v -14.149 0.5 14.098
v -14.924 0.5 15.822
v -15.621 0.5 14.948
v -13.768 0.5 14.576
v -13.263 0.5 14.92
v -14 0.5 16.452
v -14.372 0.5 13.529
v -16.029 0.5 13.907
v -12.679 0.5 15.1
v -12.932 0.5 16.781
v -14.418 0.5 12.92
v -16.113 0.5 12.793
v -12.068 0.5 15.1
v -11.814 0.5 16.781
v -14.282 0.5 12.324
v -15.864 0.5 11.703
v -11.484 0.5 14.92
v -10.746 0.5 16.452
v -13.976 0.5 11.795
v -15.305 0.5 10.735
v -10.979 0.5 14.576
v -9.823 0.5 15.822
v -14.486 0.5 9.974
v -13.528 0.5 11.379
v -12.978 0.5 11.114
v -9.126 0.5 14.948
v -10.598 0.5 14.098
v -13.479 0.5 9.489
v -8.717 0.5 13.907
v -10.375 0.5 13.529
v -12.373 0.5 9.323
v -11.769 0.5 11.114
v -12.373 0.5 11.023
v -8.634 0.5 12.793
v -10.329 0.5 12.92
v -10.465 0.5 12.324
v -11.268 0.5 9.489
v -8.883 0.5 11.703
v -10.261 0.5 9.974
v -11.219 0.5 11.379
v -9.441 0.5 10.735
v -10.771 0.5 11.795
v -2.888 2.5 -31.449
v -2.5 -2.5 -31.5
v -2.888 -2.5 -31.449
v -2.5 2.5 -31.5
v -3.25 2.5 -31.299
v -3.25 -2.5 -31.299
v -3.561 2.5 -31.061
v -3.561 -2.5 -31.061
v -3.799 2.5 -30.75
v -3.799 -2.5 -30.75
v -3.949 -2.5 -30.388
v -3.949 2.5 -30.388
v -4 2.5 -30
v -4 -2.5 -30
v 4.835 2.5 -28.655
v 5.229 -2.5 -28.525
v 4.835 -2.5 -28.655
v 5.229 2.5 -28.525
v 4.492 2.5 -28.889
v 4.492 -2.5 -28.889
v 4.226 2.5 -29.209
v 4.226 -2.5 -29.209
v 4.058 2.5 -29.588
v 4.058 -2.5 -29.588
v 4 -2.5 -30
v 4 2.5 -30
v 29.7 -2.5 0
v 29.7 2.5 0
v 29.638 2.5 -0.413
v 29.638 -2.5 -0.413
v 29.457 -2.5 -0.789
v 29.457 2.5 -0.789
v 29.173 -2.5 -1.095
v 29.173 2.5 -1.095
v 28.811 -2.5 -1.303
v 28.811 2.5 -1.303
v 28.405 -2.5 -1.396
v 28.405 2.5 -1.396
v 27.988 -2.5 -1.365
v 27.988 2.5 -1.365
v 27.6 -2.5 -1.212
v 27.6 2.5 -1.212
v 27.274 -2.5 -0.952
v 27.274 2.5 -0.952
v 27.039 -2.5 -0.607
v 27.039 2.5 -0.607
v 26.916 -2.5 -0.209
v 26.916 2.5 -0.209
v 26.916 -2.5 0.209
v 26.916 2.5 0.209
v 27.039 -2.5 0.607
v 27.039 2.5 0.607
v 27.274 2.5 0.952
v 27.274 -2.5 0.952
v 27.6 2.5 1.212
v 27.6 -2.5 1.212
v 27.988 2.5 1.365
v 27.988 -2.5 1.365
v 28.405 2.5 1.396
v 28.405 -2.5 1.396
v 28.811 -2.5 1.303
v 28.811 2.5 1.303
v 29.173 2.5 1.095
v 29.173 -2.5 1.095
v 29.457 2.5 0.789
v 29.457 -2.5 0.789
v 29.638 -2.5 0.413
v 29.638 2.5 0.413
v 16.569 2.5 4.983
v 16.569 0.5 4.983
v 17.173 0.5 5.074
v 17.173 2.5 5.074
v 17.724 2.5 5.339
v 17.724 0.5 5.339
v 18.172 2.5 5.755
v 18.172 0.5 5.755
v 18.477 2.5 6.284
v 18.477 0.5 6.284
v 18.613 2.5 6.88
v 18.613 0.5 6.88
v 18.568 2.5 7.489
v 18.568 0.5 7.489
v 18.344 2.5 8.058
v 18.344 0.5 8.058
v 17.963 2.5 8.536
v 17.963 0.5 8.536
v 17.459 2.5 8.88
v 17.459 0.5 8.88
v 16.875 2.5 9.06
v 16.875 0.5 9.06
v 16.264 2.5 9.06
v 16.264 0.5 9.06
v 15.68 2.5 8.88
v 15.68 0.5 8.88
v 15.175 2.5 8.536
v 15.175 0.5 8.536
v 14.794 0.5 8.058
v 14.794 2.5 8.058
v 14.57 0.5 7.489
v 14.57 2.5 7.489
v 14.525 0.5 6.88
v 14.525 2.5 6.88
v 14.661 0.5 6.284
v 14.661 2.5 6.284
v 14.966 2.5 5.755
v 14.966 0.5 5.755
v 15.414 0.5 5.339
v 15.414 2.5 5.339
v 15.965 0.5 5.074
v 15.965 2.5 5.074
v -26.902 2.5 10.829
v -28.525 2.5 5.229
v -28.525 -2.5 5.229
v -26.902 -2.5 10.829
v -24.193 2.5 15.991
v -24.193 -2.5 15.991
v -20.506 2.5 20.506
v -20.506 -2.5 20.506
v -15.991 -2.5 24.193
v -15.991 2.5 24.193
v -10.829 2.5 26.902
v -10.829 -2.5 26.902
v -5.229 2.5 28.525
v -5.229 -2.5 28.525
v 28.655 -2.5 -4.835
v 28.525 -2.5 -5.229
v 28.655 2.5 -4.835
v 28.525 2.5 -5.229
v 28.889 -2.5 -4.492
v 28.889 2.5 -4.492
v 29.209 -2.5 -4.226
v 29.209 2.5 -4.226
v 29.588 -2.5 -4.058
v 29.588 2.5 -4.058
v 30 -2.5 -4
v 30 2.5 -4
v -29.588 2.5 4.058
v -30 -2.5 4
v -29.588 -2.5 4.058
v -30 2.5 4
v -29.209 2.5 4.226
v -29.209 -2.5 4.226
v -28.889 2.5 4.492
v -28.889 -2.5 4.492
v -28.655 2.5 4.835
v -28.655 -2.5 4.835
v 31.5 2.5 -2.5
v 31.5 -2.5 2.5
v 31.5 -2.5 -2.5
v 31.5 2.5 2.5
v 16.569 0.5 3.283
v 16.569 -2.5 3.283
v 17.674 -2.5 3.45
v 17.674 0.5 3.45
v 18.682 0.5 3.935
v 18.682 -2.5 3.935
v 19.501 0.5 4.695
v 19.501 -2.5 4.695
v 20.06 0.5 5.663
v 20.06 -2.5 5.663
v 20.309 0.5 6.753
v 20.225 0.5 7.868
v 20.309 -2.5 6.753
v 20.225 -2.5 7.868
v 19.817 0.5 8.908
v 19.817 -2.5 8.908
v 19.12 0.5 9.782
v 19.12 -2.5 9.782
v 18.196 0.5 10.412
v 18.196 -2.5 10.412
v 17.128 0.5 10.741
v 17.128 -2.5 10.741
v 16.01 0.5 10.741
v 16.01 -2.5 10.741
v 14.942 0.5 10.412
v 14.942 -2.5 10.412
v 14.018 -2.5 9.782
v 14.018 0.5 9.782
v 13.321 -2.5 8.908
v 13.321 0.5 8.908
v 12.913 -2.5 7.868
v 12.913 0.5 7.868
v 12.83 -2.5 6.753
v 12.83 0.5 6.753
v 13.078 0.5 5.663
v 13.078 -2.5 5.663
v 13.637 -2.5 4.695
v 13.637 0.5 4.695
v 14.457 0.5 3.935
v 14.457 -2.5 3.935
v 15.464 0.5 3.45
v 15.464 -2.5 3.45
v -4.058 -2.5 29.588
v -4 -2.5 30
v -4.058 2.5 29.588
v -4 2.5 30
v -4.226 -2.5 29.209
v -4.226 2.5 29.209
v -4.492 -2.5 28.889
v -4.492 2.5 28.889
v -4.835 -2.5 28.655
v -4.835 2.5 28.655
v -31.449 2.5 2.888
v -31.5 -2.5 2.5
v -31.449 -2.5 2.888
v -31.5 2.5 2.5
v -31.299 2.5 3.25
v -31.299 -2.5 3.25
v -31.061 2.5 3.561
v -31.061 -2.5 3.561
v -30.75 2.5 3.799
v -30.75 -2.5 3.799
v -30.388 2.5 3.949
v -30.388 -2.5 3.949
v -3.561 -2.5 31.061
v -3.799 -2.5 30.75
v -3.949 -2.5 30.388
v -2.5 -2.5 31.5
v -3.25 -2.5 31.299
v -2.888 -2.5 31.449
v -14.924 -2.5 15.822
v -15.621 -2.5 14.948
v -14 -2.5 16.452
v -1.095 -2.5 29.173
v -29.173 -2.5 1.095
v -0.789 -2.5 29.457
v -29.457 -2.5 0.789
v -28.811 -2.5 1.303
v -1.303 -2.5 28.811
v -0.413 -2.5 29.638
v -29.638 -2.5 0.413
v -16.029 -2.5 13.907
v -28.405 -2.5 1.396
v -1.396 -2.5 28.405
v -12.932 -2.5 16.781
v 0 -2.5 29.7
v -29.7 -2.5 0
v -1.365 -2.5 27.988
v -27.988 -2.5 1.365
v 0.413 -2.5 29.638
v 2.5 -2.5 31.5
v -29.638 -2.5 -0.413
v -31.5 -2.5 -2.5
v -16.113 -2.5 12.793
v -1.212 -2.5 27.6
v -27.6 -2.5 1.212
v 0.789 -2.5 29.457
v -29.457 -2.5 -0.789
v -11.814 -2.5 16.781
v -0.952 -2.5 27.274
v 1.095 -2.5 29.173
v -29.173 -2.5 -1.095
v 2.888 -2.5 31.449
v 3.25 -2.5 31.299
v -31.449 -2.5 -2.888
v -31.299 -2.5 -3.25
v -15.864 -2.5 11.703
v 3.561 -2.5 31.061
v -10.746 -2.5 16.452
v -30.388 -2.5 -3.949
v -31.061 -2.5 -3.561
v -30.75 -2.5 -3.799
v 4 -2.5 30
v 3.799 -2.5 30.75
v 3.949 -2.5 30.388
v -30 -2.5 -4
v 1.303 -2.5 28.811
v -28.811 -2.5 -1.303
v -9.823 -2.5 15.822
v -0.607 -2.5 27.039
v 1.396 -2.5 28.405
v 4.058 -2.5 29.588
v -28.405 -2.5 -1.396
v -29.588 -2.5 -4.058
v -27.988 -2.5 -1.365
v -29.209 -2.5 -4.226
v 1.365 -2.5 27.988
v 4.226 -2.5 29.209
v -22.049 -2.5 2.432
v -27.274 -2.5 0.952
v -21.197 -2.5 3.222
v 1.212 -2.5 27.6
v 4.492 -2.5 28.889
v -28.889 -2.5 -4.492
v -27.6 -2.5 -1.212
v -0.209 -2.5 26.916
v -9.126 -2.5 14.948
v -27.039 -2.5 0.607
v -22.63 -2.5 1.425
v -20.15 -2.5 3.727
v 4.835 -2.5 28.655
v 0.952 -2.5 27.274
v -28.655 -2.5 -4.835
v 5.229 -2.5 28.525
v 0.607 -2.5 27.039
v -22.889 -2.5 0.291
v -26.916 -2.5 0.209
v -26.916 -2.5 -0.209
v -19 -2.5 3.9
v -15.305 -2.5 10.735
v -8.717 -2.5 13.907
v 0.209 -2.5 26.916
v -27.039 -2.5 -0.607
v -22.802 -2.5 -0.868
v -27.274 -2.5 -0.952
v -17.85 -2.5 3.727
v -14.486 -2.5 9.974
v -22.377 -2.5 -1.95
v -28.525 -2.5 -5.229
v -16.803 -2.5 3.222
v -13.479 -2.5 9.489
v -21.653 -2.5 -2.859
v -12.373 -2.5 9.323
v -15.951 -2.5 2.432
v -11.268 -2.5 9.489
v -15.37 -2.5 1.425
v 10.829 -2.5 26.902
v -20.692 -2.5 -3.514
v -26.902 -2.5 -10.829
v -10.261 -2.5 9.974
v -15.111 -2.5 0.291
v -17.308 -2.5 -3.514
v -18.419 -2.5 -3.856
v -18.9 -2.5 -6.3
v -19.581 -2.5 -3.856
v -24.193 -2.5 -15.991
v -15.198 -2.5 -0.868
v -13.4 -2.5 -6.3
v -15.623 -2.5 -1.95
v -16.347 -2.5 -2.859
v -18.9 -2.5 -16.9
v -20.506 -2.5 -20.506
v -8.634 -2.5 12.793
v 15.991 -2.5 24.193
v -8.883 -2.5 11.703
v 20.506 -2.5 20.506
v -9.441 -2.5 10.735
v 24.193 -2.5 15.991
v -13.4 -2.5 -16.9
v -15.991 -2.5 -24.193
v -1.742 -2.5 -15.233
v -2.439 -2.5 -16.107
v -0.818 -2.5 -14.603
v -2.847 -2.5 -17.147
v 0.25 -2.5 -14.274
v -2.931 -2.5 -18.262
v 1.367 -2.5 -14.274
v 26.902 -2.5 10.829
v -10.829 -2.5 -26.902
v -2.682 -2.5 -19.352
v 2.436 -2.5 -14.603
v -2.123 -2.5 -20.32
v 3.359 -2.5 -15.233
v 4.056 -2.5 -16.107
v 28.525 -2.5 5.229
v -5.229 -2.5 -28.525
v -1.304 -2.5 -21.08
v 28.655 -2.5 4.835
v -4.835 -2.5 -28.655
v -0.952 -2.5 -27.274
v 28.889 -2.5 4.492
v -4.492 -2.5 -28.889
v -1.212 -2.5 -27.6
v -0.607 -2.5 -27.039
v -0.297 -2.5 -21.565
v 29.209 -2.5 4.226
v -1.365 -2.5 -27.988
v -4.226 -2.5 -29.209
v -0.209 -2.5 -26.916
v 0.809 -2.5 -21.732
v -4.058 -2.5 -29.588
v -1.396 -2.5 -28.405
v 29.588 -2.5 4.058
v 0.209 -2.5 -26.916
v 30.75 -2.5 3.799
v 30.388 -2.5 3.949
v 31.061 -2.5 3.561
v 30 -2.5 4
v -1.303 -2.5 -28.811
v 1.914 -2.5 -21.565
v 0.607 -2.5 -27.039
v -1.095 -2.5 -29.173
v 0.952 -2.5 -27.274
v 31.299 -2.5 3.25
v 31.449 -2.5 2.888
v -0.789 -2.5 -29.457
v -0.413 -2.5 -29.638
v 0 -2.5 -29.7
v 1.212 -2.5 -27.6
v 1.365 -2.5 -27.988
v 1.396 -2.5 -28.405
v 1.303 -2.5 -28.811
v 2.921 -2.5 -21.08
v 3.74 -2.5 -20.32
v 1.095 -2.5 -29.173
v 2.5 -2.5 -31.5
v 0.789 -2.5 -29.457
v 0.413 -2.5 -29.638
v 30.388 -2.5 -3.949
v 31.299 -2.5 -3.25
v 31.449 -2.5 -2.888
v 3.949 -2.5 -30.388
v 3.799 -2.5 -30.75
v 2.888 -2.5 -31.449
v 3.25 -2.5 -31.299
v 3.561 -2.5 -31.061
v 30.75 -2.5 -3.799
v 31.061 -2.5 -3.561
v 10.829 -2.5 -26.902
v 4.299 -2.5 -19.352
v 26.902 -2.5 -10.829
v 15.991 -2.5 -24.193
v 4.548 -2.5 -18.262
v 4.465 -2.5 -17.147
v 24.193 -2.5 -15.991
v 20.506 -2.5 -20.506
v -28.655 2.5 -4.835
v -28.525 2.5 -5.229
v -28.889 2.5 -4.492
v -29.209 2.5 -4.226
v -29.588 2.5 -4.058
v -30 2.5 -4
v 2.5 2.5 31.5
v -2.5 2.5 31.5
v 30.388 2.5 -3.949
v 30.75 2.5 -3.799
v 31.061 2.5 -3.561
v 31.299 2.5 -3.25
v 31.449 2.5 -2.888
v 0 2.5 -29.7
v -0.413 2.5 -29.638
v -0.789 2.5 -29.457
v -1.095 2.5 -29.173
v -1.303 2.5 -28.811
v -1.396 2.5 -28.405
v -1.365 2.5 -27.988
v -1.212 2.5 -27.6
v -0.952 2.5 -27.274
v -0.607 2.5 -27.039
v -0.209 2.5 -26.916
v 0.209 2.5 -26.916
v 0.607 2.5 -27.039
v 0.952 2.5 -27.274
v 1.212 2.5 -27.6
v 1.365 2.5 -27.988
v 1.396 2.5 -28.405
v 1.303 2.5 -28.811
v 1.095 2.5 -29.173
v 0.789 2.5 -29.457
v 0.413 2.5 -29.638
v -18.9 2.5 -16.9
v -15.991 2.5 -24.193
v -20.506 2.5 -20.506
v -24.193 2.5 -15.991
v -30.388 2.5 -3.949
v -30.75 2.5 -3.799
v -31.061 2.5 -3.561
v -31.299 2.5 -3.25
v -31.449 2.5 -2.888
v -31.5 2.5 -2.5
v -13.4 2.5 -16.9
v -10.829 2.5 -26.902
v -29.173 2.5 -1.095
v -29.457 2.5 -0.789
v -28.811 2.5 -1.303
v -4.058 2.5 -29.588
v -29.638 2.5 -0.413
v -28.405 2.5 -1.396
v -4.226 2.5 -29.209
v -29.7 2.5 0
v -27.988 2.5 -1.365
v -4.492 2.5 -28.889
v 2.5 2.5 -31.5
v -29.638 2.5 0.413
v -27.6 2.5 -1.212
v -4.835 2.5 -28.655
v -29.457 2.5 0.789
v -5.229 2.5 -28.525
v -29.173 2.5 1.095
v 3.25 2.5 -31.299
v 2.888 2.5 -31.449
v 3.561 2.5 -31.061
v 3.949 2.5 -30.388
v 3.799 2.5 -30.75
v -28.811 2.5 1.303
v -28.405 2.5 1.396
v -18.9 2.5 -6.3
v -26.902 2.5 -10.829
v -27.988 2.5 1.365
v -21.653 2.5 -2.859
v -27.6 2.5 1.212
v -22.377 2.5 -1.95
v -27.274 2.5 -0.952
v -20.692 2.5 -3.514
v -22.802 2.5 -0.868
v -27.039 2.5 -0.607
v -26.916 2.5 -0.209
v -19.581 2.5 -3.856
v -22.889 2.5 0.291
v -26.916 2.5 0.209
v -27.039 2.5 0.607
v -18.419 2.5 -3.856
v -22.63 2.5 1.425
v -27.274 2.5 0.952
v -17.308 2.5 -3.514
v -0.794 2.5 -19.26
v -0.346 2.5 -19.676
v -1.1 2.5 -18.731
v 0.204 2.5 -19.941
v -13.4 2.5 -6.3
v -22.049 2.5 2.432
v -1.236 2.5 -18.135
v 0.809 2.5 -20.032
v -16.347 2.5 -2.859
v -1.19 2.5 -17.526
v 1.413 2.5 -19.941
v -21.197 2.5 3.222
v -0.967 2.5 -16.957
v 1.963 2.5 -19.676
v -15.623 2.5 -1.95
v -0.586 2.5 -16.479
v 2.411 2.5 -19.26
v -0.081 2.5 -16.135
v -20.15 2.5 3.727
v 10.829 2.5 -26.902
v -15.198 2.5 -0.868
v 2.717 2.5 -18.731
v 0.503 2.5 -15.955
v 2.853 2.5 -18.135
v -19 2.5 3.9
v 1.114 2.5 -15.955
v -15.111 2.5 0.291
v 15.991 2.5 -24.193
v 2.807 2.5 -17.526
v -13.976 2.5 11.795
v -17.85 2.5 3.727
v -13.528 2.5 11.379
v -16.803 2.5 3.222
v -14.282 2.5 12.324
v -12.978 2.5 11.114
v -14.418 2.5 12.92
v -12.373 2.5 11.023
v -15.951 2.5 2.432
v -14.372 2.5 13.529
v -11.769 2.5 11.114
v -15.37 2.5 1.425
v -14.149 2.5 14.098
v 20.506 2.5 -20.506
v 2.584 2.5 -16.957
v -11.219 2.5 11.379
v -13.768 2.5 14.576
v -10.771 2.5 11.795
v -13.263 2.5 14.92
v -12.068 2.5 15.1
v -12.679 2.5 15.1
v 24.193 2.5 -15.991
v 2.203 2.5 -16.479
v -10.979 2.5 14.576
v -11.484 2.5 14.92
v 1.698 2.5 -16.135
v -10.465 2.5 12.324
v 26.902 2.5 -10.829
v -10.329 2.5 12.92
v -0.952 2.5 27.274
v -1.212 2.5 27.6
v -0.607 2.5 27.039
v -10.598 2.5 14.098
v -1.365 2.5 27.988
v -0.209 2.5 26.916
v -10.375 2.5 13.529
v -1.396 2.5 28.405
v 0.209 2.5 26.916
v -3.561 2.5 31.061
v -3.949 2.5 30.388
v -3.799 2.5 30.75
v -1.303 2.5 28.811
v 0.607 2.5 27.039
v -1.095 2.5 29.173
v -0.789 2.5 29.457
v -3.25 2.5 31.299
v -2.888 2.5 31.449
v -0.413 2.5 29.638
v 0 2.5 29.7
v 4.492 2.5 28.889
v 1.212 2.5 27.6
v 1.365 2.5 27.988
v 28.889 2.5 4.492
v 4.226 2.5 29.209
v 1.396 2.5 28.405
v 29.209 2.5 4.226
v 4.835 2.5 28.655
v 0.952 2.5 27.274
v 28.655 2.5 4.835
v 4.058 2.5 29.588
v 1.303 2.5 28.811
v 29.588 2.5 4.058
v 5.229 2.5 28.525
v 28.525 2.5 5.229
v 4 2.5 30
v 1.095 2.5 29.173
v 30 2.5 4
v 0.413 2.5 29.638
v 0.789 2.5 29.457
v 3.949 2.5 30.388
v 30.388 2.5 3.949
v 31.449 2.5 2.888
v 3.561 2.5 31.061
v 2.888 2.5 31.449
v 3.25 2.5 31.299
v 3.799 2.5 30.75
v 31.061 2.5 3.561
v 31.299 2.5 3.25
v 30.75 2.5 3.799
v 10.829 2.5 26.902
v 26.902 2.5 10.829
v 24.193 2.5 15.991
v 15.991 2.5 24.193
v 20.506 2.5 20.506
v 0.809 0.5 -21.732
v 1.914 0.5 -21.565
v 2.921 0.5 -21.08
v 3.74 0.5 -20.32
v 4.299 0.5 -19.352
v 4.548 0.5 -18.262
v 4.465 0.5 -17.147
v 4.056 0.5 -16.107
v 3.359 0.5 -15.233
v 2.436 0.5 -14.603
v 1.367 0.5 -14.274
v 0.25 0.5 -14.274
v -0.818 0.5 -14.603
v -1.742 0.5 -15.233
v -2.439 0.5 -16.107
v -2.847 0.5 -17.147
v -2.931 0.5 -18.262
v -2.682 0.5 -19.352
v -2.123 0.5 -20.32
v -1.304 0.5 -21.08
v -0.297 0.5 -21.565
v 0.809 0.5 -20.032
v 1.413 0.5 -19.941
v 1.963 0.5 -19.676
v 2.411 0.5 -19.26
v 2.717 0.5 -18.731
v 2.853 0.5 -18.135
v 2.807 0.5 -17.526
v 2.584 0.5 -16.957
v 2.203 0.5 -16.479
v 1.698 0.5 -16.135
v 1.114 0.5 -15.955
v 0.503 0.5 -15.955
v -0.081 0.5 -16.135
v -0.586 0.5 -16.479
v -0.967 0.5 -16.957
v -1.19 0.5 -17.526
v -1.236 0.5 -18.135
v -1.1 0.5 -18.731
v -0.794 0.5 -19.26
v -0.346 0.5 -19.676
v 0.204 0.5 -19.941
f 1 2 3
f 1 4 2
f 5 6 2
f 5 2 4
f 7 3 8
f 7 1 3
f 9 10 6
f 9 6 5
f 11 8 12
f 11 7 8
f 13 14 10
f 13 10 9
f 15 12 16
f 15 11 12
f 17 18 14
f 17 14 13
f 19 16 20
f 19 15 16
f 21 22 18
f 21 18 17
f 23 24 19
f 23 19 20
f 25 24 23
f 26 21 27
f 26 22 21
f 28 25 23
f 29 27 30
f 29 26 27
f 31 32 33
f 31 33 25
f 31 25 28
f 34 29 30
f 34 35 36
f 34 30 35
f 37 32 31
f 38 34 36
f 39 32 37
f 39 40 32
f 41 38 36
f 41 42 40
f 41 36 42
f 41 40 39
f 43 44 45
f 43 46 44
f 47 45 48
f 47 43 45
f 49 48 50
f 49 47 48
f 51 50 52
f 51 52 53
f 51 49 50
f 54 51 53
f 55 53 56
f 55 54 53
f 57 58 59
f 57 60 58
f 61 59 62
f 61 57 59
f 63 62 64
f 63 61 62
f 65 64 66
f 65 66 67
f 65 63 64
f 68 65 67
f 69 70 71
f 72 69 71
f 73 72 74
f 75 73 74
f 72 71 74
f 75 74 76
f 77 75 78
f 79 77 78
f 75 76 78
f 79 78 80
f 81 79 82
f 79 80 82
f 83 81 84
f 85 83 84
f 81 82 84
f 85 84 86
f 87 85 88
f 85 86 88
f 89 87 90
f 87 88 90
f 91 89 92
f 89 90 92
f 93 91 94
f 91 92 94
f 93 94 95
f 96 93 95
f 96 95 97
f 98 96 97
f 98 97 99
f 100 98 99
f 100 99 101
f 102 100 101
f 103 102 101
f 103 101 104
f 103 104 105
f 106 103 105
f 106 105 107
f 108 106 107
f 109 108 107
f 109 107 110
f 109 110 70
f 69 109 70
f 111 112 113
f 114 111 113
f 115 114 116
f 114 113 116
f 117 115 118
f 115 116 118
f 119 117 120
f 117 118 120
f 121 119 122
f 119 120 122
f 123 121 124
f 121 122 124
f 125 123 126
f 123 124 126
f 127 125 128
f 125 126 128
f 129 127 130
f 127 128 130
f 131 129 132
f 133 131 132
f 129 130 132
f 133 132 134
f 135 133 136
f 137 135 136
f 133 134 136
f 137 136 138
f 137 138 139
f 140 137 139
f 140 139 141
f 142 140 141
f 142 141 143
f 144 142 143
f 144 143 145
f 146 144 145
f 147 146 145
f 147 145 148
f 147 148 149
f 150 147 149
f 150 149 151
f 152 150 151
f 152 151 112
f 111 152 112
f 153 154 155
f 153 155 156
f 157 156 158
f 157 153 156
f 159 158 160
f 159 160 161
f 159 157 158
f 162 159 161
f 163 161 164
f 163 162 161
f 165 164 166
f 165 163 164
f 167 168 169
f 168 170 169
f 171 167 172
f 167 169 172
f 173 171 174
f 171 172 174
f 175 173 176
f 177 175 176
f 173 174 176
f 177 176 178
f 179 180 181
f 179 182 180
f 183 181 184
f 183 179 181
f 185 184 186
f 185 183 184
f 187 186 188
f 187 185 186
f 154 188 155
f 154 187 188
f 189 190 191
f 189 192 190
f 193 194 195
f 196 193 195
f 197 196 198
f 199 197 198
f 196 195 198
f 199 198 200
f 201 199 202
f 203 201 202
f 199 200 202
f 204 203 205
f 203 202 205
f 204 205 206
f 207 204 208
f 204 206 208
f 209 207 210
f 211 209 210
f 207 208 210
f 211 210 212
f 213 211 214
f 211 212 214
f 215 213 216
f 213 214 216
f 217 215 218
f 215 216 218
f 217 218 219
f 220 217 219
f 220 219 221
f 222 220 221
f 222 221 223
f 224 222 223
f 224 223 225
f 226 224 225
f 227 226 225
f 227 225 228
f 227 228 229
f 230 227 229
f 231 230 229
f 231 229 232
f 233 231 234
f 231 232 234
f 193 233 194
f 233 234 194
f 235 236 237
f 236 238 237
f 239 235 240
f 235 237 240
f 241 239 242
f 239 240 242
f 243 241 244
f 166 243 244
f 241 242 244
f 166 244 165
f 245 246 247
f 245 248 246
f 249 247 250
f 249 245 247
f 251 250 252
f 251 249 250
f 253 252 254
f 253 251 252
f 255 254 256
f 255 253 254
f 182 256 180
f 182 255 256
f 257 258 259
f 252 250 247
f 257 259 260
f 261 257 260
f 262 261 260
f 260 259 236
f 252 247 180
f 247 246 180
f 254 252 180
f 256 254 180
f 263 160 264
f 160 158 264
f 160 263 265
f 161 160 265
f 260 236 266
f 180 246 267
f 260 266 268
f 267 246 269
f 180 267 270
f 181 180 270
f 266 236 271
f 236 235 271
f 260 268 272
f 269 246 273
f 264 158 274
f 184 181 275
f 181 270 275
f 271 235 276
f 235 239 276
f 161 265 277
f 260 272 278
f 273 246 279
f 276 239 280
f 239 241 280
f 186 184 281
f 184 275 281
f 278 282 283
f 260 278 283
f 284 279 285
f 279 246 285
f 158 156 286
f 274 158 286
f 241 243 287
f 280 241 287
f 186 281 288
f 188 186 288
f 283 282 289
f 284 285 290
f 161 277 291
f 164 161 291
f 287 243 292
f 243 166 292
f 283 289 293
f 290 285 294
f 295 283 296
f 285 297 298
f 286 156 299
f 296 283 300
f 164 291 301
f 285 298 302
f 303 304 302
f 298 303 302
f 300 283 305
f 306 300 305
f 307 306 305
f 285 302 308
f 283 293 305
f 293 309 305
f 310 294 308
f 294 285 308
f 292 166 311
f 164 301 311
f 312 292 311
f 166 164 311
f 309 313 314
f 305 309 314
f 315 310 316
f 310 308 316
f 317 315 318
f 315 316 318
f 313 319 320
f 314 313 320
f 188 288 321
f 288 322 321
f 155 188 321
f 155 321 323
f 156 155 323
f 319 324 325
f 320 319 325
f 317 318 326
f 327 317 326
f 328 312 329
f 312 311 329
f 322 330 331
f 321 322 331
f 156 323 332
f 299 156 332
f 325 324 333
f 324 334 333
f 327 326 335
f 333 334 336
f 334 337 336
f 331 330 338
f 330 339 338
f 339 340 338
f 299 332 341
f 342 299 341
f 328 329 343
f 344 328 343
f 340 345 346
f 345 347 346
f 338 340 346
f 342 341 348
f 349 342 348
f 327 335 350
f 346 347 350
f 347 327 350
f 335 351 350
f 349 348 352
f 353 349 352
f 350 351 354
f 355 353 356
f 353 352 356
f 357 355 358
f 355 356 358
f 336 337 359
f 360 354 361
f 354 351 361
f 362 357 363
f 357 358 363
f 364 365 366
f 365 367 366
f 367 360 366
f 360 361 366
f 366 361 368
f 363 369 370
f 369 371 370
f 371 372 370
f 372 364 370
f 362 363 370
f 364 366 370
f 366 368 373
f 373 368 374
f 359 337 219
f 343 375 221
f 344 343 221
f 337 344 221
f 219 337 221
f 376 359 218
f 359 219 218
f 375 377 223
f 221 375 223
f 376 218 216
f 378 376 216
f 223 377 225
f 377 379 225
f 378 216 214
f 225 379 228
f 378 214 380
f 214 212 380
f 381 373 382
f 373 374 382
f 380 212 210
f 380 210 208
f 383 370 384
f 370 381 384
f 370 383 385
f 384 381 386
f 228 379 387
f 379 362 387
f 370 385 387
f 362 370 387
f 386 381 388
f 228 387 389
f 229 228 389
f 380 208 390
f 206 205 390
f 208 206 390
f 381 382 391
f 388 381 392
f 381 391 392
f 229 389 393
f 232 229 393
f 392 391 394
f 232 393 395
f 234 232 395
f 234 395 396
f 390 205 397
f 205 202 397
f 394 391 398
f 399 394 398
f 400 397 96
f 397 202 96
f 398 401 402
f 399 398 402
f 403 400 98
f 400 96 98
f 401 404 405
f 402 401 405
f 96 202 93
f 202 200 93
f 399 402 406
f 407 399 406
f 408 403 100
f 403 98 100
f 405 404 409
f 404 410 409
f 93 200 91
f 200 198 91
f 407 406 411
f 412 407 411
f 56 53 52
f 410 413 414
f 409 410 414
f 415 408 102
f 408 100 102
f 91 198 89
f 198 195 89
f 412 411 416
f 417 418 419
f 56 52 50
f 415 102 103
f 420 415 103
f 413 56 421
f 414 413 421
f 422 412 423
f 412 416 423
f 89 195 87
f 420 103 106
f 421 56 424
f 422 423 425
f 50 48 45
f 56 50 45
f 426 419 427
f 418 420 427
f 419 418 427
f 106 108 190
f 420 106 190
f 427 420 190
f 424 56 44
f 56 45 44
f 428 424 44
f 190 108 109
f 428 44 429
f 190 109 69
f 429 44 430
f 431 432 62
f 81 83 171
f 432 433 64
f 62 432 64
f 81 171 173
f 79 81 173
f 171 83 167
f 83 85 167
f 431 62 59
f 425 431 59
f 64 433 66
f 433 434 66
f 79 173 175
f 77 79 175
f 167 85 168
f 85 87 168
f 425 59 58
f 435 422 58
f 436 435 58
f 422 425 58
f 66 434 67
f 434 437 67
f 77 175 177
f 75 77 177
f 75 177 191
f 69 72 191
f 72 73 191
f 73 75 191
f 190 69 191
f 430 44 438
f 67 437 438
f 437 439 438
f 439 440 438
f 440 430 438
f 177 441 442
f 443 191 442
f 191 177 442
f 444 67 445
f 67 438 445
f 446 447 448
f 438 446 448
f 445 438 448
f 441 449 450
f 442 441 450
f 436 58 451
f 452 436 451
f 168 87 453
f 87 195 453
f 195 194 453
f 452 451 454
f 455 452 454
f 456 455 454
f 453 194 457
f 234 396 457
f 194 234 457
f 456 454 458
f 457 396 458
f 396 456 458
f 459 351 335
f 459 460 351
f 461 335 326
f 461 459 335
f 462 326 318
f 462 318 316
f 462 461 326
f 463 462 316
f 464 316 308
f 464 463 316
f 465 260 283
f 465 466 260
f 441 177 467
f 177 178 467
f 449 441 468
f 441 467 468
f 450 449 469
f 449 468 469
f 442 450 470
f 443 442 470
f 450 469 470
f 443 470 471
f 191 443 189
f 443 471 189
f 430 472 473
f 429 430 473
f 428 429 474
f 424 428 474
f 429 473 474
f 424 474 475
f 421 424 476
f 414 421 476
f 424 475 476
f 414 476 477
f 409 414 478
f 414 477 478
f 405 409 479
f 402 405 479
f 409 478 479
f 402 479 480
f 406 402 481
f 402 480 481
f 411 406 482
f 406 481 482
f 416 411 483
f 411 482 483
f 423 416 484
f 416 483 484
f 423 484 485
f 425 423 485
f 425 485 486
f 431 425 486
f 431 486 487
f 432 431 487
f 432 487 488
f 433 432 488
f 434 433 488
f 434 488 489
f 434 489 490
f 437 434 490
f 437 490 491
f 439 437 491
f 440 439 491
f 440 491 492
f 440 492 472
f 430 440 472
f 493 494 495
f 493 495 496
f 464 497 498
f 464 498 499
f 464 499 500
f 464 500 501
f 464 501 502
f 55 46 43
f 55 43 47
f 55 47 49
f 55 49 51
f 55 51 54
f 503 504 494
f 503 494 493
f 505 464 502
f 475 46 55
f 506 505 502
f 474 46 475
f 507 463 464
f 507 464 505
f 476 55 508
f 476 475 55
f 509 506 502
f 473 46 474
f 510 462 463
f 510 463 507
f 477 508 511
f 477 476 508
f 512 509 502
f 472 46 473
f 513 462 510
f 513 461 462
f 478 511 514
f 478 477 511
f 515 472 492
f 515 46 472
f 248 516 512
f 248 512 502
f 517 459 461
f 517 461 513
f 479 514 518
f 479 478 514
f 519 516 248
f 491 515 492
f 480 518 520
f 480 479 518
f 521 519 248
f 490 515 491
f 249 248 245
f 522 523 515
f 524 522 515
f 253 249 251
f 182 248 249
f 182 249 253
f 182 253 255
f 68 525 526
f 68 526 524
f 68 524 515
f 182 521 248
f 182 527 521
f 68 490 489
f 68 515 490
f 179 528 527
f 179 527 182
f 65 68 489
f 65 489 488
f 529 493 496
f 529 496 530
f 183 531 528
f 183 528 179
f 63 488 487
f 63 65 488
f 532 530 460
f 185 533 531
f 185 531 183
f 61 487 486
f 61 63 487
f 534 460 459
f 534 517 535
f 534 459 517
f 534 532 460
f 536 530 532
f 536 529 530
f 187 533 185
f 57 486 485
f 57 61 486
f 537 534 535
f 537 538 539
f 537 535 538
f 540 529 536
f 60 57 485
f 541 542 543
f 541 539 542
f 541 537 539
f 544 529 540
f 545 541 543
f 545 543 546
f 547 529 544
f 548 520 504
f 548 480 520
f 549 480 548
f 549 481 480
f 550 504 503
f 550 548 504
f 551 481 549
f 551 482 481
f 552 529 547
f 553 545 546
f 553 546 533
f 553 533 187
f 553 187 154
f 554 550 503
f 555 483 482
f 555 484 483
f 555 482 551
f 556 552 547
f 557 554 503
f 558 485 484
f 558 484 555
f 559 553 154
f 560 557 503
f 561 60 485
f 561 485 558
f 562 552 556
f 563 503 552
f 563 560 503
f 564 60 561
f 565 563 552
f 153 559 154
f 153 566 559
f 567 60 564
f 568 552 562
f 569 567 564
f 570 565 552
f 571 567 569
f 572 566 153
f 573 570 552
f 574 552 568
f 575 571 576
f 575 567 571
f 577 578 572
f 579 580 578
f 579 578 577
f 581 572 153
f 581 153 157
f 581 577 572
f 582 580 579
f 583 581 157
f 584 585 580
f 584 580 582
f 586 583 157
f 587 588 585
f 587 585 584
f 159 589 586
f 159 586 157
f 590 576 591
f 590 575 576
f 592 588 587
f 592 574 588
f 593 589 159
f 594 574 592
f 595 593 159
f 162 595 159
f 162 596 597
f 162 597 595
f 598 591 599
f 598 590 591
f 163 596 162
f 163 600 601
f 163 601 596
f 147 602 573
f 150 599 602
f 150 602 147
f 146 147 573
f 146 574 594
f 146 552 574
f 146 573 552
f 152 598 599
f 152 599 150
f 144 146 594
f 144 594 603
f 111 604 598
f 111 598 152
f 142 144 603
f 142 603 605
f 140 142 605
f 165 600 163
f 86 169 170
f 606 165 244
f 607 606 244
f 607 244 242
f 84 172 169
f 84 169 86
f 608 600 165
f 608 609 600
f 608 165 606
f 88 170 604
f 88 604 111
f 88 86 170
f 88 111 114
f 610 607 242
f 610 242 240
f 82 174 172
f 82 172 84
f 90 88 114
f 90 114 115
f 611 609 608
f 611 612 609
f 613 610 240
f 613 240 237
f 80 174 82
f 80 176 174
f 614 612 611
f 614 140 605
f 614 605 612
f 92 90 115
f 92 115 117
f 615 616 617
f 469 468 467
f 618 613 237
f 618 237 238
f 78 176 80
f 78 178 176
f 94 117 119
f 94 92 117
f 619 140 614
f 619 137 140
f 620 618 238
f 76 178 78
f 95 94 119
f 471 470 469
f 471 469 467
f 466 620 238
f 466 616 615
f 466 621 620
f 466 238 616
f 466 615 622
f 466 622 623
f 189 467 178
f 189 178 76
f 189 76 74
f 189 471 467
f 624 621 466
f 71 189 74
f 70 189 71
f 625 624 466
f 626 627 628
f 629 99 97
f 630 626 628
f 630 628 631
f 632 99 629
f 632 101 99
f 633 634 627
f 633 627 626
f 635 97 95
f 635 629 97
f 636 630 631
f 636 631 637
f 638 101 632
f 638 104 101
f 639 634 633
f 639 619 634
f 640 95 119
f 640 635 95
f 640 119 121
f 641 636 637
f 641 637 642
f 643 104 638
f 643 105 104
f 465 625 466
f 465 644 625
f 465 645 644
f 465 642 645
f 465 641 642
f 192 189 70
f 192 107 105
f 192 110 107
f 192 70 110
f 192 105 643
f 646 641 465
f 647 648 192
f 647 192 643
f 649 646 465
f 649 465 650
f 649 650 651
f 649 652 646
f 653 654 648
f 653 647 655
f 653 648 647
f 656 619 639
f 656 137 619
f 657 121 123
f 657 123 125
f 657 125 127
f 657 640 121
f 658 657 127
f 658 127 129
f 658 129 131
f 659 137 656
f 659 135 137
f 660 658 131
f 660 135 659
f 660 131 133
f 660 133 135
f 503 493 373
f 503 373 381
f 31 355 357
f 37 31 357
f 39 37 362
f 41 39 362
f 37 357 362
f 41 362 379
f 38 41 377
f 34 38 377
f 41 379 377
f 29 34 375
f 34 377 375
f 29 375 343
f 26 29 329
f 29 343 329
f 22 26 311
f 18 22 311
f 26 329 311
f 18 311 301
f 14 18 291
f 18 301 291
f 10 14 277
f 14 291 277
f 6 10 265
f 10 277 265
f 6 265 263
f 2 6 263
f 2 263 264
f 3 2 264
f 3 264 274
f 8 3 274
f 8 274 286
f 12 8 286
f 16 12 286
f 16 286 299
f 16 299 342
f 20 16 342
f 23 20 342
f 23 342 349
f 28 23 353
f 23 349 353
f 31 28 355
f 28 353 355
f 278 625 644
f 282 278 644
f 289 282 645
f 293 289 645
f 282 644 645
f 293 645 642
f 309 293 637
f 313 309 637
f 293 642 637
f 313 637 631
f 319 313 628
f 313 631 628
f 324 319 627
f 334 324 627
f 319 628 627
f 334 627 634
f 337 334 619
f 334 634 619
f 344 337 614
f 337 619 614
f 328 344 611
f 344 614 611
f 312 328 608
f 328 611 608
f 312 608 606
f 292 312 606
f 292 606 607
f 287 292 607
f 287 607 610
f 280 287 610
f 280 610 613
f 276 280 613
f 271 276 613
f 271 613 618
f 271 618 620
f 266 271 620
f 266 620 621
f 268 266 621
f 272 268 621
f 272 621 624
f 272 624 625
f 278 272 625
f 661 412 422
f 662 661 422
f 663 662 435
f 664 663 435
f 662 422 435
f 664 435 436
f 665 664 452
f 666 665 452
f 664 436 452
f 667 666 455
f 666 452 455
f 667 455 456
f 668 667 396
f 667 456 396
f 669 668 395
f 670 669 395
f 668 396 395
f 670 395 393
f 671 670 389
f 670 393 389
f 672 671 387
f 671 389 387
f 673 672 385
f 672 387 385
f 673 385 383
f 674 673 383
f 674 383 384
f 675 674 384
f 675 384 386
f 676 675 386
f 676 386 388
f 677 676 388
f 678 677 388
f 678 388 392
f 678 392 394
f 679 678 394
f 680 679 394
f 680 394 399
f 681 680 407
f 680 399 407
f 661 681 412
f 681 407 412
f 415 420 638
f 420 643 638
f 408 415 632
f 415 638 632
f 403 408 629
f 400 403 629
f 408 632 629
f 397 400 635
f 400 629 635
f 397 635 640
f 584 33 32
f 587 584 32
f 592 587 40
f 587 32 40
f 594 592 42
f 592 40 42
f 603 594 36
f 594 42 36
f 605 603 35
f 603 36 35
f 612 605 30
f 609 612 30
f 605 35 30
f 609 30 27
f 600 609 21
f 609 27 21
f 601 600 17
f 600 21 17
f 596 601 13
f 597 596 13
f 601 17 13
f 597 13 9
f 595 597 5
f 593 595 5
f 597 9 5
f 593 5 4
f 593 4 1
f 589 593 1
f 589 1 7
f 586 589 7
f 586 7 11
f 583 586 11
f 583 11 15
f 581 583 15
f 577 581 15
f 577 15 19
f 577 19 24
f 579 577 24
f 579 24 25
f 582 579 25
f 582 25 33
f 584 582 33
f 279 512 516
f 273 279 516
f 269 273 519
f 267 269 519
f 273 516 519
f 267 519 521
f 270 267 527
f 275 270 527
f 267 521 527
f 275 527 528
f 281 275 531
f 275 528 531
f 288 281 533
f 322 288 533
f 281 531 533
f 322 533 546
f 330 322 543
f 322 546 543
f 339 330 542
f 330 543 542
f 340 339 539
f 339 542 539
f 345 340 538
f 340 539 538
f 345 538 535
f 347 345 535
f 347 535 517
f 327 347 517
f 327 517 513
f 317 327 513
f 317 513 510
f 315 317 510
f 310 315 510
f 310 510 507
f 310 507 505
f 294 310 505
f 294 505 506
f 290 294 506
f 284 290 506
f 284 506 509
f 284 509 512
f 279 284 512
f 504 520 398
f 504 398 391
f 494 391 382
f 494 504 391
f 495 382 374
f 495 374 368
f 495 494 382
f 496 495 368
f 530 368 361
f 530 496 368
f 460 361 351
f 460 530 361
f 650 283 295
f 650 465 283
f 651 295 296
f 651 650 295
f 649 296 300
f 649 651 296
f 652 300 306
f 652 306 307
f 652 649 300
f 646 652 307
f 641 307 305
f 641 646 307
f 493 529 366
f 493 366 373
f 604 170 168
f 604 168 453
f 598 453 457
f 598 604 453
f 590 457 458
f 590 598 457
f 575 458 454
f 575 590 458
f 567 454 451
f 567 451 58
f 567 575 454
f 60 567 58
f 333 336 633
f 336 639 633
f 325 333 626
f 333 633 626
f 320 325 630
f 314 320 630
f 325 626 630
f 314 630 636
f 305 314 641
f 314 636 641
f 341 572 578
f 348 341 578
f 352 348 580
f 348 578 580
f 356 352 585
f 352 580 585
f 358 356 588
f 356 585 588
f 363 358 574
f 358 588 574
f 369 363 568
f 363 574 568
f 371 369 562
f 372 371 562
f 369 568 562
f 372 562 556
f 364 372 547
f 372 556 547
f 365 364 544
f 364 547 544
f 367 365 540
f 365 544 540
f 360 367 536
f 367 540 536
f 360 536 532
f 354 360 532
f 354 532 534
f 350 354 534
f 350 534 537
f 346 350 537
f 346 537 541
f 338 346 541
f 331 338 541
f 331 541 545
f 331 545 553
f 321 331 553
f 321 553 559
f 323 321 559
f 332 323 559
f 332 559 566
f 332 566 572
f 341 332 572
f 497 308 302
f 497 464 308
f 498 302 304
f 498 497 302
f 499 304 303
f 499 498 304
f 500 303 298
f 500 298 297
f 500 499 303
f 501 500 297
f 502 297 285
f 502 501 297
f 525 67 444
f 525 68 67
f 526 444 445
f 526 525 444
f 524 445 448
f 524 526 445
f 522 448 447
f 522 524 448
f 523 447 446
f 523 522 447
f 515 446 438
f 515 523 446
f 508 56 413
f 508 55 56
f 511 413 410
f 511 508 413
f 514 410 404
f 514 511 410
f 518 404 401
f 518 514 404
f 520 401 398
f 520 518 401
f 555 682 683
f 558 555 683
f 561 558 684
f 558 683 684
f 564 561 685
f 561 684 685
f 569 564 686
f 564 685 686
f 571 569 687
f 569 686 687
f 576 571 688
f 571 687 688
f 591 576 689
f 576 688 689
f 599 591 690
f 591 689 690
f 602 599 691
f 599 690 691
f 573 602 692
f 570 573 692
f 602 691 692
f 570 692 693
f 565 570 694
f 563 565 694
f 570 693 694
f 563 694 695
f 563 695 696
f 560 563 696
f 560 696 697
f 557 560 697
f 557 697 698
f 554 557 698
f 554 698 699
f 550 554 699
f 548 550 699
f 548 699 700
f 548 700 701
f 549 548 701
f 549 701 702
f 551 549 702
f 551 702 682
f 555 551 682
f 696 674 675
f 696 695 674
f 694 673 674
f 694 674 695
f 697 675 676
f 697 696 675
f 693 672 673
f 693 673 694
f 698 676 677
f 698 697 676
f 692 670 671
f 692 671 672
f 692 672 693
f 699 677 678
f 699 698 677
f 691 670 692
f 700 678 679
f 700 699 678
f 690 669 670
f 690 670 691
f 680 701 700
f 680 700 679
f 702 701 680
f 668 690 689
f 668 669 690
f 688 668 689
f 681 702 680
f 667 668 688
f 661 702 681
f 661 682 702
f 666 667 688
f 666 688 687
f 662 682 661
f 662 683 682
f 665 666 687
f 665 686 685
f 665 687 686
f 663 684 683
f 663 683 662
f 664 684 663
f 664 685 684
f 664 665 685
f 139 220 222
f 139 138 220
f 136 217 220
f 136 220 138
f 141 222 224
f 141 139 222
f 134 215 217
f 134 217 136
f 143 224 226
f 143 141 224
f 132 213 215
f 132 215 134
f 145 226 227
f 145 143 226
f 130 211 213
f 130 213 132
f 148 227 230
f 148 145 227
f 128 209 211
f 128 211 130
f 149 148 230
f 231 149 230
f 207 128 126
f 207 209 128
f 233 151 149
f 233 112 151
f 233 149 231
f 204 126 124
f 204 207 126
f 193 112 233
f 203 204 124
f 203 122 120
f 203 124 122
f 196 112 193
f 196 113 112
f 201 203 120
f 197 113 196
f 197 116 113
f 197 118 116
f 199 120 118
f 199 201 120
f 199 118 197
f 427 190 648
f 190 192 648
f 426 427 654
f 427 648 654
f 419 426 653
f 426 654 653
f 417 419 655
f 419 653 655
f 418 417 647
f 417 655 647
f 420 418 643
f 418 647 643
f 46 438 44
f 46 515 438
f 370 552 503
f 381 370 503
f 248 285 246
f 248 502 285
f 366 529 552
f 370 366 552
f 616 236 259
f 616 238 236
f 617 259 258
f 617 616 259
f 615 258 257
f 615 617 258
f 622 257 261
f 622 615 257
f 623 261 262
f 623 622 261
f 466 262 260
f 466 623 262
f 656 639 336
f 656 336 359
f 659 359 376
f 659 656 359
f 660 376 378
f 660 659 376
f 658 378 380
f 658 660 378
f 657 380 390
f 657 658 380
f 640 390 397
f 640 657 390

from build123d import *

# Parameters (mm, degrees)
SKETCH1_R                = 29
BOSS_EXTRUDE1_DEPTH      = 2.5
SKETCH3_W                = 8
SKETCH3_H                = 5
BOSS_EXTRUDE2_DEPTH      = 31.5
SKETCH5_R                = 1.4
CUT_EXTRUDE1_DEPTH       = 44.107423955
FILLET2_R                = 1.5
CIRPATTERN1_COUNT        = 4
FILLET2_OF_CIRPATTERN1_R = 1.5
SKETCH6_R                = 3.9
CUT_EXTRUDE2_DEPTH       = 45.827446949
SKETCH7_W                = 5.5
SKETCH7_H                = 10.6
CUT_EXTRUDE3_DEPTH       = 45.827446949
SKETCH8_R                = 2.05
CUT_EXTRUDE4_DEPTH       = 45.827446949
SKETCH9_R                = 3.75
CUT_EXTRUDE5_DEPTH       = 3


with BuildPart() as part:
    # Sketch1 → Boss-Extrude1 (new, symmetric)
    with BuildSketch(Plane(origin=(0, 0, 0), x_dir=(1, 0, 0), z_dir=(0, 1, 0))):
        with Locations(Location((0, 0, 0), (0, 0, 270))):
            Circle(SKETCH1_R)
    extrude(amount=BOSS_EXTRUDE1_DEPTH, both=True)

    # Sketch3 → Boss-Extrude2 (add)
    with BuildSketch(Plane.XY):
        Rectangle(SKETCH3_W, SKETCH3_H)
    boss_extrude2 = extrude(amount=BOSS_EXTRUDE2_DEPTH)

    # Sketch5 → Cut-Extrude1 (cut, through all)
    with BuildSketch(Plane(origin=(0, 2.5, 0), x_dir=(1, 0, 0), z_dir=(0, 1, 0))):
        with Locations(Location((0, -28.3, 0), (0, 0, 270))):
            Circle(SKETCH5_R)
    cut_extrude1 = extrude(amount=-CUT_EXTRUDE1_DEPTH, mode=Mode.SUBTRACT)

    # Fillet2
    fillet2_edges = [part.edges().sort_by_distance(p)[0] for p in [
        (4, 0, 28.722813233),
        (-4, 0, 28.722813233),
        (-4, 0, 31.5),
        (4, 0, 31.5),
    ]]
    fillet(fillet2_edges, radius=FILLET2_R - 0.0001)  # a hair under: the kernel refuses the full size

    # CirPattern1: Boss-Extrude2, Cut-Extrude1 ×4 about axis
    cirpattern1_axis = Axis((0, 0, 0), (0, 1, 0))
    add([boss_extrude2.rotate(cirpattern1_axis, i * 360 / CIRPATTERN1_COUNT) for i in range(1, CIRPATTERN1_COUNT)])
    add([cut_extrude1.rotate(cirpattern1_axis, i * 360 / CIRPATTERN1_COUNT) for i in range(1, CIRPATTERN1_COUNT)], mode=Mode.SUBTRACT)

    # Fillet2 of CirPattern1
    fillet2_of_cirpattern1_edges = [part.edges().sort_by_distance(p)[0] for p in [
        (28.722813233, 0, -4),
        (28.722813233, 0, 4),
        (31.5, 0, 4),
        (31.5, 0, -4),
        (-4, 0, -28.722813233),
        (4, 0, -28.722813233),
        (4, 0, -31.5),
        (-4, 0, -31.5),
        (-28.722813233, 0, 4),
        (-28.722813233, 0, -4),
        (-31.5, 0, -4),
        (-31.5, 0, 4),
    ]]
    fillet(fillet2_of_cirpattern1_edges, radius=FILLET2_OF_CIRPATTERN1_R - 0.0001)  # a hair under: the kernel refuses the full size

    # Sketch6 → Cut-Extrude2 (cut, through all)
    with BuildSketch(Plane(origin=(0, 2.5, 0), x_dir=(1, 0, 0), z_dir=(0, 1, 0))):
        with Locations(Location((-19, 0, 0), (0, 0, 270))):
            Circle(SKETCH6_R)
    extrude(amount=-CUT_EXTRUDE2_DEPTH, mode=Mode.SUBTRACT)

    # Sketch7 → Cut-Extrude3 (cut, through all)
    with BuildSketch(Plane(origin=(0, 2.5, 0), x_dir=(1, 0, 0), z_dir=(0, 1, 0))):
        with Locations((-16.15, 11.6)):
            Rectangle(SKETCH7_W, SKETCH7_H)
    extrude(amount=-CUT_EXTRUDE3_DEPTH, mode=Mode.SUBTRACT)

    # Sketch8 → Cut-Extrude4 (cut, through all)
    with BuildSketch(Plane.XZ.offset(2.5)):
        with Locations(Location((0.80857407, -17.981829939, 0), (0, 0, 270))):
            Circle(SKETCH8_R)
        with Locations(Location((16.569087362, 7.033160313, 0), (0, 0, 270))):
            Circle(SKETCH8_R)
        with Locations(Location((-12.373363213, 13.072868194, 0), (0, 0, 270))):
            Circle(SKETCH8_R)
    extrude(amount=-CUT_EXTRUDE4_DEPTH, mode=Mode.SUBTRACT)

    # Sketch9 → Cut-Extrude5 (cut)
    with BuildSketch(Plane(origin=(0, -2.5, 0), x_dir=(-1, 0, 0), z_dir=(0, -1, 0))):
        with Locations(Location((-0.80857407, 17.981829939, 0), (0, 0, 90))):
            Circle(SKETCH9_R)
        with Locations(Location((12.373363213, -13.072868194, 0), (0, 0, 90))):
            Circle(SKETCH9_R)
        with Locations(Location((-16.569087362, -7.033160313, 0), (0, 0, 90))):
            Circle(SKETCH9_R)
    extrude(amount=-CUT_EXTRUDE5_DEPTH, mode=Mode.SUBTRACT)


solid = part.part
